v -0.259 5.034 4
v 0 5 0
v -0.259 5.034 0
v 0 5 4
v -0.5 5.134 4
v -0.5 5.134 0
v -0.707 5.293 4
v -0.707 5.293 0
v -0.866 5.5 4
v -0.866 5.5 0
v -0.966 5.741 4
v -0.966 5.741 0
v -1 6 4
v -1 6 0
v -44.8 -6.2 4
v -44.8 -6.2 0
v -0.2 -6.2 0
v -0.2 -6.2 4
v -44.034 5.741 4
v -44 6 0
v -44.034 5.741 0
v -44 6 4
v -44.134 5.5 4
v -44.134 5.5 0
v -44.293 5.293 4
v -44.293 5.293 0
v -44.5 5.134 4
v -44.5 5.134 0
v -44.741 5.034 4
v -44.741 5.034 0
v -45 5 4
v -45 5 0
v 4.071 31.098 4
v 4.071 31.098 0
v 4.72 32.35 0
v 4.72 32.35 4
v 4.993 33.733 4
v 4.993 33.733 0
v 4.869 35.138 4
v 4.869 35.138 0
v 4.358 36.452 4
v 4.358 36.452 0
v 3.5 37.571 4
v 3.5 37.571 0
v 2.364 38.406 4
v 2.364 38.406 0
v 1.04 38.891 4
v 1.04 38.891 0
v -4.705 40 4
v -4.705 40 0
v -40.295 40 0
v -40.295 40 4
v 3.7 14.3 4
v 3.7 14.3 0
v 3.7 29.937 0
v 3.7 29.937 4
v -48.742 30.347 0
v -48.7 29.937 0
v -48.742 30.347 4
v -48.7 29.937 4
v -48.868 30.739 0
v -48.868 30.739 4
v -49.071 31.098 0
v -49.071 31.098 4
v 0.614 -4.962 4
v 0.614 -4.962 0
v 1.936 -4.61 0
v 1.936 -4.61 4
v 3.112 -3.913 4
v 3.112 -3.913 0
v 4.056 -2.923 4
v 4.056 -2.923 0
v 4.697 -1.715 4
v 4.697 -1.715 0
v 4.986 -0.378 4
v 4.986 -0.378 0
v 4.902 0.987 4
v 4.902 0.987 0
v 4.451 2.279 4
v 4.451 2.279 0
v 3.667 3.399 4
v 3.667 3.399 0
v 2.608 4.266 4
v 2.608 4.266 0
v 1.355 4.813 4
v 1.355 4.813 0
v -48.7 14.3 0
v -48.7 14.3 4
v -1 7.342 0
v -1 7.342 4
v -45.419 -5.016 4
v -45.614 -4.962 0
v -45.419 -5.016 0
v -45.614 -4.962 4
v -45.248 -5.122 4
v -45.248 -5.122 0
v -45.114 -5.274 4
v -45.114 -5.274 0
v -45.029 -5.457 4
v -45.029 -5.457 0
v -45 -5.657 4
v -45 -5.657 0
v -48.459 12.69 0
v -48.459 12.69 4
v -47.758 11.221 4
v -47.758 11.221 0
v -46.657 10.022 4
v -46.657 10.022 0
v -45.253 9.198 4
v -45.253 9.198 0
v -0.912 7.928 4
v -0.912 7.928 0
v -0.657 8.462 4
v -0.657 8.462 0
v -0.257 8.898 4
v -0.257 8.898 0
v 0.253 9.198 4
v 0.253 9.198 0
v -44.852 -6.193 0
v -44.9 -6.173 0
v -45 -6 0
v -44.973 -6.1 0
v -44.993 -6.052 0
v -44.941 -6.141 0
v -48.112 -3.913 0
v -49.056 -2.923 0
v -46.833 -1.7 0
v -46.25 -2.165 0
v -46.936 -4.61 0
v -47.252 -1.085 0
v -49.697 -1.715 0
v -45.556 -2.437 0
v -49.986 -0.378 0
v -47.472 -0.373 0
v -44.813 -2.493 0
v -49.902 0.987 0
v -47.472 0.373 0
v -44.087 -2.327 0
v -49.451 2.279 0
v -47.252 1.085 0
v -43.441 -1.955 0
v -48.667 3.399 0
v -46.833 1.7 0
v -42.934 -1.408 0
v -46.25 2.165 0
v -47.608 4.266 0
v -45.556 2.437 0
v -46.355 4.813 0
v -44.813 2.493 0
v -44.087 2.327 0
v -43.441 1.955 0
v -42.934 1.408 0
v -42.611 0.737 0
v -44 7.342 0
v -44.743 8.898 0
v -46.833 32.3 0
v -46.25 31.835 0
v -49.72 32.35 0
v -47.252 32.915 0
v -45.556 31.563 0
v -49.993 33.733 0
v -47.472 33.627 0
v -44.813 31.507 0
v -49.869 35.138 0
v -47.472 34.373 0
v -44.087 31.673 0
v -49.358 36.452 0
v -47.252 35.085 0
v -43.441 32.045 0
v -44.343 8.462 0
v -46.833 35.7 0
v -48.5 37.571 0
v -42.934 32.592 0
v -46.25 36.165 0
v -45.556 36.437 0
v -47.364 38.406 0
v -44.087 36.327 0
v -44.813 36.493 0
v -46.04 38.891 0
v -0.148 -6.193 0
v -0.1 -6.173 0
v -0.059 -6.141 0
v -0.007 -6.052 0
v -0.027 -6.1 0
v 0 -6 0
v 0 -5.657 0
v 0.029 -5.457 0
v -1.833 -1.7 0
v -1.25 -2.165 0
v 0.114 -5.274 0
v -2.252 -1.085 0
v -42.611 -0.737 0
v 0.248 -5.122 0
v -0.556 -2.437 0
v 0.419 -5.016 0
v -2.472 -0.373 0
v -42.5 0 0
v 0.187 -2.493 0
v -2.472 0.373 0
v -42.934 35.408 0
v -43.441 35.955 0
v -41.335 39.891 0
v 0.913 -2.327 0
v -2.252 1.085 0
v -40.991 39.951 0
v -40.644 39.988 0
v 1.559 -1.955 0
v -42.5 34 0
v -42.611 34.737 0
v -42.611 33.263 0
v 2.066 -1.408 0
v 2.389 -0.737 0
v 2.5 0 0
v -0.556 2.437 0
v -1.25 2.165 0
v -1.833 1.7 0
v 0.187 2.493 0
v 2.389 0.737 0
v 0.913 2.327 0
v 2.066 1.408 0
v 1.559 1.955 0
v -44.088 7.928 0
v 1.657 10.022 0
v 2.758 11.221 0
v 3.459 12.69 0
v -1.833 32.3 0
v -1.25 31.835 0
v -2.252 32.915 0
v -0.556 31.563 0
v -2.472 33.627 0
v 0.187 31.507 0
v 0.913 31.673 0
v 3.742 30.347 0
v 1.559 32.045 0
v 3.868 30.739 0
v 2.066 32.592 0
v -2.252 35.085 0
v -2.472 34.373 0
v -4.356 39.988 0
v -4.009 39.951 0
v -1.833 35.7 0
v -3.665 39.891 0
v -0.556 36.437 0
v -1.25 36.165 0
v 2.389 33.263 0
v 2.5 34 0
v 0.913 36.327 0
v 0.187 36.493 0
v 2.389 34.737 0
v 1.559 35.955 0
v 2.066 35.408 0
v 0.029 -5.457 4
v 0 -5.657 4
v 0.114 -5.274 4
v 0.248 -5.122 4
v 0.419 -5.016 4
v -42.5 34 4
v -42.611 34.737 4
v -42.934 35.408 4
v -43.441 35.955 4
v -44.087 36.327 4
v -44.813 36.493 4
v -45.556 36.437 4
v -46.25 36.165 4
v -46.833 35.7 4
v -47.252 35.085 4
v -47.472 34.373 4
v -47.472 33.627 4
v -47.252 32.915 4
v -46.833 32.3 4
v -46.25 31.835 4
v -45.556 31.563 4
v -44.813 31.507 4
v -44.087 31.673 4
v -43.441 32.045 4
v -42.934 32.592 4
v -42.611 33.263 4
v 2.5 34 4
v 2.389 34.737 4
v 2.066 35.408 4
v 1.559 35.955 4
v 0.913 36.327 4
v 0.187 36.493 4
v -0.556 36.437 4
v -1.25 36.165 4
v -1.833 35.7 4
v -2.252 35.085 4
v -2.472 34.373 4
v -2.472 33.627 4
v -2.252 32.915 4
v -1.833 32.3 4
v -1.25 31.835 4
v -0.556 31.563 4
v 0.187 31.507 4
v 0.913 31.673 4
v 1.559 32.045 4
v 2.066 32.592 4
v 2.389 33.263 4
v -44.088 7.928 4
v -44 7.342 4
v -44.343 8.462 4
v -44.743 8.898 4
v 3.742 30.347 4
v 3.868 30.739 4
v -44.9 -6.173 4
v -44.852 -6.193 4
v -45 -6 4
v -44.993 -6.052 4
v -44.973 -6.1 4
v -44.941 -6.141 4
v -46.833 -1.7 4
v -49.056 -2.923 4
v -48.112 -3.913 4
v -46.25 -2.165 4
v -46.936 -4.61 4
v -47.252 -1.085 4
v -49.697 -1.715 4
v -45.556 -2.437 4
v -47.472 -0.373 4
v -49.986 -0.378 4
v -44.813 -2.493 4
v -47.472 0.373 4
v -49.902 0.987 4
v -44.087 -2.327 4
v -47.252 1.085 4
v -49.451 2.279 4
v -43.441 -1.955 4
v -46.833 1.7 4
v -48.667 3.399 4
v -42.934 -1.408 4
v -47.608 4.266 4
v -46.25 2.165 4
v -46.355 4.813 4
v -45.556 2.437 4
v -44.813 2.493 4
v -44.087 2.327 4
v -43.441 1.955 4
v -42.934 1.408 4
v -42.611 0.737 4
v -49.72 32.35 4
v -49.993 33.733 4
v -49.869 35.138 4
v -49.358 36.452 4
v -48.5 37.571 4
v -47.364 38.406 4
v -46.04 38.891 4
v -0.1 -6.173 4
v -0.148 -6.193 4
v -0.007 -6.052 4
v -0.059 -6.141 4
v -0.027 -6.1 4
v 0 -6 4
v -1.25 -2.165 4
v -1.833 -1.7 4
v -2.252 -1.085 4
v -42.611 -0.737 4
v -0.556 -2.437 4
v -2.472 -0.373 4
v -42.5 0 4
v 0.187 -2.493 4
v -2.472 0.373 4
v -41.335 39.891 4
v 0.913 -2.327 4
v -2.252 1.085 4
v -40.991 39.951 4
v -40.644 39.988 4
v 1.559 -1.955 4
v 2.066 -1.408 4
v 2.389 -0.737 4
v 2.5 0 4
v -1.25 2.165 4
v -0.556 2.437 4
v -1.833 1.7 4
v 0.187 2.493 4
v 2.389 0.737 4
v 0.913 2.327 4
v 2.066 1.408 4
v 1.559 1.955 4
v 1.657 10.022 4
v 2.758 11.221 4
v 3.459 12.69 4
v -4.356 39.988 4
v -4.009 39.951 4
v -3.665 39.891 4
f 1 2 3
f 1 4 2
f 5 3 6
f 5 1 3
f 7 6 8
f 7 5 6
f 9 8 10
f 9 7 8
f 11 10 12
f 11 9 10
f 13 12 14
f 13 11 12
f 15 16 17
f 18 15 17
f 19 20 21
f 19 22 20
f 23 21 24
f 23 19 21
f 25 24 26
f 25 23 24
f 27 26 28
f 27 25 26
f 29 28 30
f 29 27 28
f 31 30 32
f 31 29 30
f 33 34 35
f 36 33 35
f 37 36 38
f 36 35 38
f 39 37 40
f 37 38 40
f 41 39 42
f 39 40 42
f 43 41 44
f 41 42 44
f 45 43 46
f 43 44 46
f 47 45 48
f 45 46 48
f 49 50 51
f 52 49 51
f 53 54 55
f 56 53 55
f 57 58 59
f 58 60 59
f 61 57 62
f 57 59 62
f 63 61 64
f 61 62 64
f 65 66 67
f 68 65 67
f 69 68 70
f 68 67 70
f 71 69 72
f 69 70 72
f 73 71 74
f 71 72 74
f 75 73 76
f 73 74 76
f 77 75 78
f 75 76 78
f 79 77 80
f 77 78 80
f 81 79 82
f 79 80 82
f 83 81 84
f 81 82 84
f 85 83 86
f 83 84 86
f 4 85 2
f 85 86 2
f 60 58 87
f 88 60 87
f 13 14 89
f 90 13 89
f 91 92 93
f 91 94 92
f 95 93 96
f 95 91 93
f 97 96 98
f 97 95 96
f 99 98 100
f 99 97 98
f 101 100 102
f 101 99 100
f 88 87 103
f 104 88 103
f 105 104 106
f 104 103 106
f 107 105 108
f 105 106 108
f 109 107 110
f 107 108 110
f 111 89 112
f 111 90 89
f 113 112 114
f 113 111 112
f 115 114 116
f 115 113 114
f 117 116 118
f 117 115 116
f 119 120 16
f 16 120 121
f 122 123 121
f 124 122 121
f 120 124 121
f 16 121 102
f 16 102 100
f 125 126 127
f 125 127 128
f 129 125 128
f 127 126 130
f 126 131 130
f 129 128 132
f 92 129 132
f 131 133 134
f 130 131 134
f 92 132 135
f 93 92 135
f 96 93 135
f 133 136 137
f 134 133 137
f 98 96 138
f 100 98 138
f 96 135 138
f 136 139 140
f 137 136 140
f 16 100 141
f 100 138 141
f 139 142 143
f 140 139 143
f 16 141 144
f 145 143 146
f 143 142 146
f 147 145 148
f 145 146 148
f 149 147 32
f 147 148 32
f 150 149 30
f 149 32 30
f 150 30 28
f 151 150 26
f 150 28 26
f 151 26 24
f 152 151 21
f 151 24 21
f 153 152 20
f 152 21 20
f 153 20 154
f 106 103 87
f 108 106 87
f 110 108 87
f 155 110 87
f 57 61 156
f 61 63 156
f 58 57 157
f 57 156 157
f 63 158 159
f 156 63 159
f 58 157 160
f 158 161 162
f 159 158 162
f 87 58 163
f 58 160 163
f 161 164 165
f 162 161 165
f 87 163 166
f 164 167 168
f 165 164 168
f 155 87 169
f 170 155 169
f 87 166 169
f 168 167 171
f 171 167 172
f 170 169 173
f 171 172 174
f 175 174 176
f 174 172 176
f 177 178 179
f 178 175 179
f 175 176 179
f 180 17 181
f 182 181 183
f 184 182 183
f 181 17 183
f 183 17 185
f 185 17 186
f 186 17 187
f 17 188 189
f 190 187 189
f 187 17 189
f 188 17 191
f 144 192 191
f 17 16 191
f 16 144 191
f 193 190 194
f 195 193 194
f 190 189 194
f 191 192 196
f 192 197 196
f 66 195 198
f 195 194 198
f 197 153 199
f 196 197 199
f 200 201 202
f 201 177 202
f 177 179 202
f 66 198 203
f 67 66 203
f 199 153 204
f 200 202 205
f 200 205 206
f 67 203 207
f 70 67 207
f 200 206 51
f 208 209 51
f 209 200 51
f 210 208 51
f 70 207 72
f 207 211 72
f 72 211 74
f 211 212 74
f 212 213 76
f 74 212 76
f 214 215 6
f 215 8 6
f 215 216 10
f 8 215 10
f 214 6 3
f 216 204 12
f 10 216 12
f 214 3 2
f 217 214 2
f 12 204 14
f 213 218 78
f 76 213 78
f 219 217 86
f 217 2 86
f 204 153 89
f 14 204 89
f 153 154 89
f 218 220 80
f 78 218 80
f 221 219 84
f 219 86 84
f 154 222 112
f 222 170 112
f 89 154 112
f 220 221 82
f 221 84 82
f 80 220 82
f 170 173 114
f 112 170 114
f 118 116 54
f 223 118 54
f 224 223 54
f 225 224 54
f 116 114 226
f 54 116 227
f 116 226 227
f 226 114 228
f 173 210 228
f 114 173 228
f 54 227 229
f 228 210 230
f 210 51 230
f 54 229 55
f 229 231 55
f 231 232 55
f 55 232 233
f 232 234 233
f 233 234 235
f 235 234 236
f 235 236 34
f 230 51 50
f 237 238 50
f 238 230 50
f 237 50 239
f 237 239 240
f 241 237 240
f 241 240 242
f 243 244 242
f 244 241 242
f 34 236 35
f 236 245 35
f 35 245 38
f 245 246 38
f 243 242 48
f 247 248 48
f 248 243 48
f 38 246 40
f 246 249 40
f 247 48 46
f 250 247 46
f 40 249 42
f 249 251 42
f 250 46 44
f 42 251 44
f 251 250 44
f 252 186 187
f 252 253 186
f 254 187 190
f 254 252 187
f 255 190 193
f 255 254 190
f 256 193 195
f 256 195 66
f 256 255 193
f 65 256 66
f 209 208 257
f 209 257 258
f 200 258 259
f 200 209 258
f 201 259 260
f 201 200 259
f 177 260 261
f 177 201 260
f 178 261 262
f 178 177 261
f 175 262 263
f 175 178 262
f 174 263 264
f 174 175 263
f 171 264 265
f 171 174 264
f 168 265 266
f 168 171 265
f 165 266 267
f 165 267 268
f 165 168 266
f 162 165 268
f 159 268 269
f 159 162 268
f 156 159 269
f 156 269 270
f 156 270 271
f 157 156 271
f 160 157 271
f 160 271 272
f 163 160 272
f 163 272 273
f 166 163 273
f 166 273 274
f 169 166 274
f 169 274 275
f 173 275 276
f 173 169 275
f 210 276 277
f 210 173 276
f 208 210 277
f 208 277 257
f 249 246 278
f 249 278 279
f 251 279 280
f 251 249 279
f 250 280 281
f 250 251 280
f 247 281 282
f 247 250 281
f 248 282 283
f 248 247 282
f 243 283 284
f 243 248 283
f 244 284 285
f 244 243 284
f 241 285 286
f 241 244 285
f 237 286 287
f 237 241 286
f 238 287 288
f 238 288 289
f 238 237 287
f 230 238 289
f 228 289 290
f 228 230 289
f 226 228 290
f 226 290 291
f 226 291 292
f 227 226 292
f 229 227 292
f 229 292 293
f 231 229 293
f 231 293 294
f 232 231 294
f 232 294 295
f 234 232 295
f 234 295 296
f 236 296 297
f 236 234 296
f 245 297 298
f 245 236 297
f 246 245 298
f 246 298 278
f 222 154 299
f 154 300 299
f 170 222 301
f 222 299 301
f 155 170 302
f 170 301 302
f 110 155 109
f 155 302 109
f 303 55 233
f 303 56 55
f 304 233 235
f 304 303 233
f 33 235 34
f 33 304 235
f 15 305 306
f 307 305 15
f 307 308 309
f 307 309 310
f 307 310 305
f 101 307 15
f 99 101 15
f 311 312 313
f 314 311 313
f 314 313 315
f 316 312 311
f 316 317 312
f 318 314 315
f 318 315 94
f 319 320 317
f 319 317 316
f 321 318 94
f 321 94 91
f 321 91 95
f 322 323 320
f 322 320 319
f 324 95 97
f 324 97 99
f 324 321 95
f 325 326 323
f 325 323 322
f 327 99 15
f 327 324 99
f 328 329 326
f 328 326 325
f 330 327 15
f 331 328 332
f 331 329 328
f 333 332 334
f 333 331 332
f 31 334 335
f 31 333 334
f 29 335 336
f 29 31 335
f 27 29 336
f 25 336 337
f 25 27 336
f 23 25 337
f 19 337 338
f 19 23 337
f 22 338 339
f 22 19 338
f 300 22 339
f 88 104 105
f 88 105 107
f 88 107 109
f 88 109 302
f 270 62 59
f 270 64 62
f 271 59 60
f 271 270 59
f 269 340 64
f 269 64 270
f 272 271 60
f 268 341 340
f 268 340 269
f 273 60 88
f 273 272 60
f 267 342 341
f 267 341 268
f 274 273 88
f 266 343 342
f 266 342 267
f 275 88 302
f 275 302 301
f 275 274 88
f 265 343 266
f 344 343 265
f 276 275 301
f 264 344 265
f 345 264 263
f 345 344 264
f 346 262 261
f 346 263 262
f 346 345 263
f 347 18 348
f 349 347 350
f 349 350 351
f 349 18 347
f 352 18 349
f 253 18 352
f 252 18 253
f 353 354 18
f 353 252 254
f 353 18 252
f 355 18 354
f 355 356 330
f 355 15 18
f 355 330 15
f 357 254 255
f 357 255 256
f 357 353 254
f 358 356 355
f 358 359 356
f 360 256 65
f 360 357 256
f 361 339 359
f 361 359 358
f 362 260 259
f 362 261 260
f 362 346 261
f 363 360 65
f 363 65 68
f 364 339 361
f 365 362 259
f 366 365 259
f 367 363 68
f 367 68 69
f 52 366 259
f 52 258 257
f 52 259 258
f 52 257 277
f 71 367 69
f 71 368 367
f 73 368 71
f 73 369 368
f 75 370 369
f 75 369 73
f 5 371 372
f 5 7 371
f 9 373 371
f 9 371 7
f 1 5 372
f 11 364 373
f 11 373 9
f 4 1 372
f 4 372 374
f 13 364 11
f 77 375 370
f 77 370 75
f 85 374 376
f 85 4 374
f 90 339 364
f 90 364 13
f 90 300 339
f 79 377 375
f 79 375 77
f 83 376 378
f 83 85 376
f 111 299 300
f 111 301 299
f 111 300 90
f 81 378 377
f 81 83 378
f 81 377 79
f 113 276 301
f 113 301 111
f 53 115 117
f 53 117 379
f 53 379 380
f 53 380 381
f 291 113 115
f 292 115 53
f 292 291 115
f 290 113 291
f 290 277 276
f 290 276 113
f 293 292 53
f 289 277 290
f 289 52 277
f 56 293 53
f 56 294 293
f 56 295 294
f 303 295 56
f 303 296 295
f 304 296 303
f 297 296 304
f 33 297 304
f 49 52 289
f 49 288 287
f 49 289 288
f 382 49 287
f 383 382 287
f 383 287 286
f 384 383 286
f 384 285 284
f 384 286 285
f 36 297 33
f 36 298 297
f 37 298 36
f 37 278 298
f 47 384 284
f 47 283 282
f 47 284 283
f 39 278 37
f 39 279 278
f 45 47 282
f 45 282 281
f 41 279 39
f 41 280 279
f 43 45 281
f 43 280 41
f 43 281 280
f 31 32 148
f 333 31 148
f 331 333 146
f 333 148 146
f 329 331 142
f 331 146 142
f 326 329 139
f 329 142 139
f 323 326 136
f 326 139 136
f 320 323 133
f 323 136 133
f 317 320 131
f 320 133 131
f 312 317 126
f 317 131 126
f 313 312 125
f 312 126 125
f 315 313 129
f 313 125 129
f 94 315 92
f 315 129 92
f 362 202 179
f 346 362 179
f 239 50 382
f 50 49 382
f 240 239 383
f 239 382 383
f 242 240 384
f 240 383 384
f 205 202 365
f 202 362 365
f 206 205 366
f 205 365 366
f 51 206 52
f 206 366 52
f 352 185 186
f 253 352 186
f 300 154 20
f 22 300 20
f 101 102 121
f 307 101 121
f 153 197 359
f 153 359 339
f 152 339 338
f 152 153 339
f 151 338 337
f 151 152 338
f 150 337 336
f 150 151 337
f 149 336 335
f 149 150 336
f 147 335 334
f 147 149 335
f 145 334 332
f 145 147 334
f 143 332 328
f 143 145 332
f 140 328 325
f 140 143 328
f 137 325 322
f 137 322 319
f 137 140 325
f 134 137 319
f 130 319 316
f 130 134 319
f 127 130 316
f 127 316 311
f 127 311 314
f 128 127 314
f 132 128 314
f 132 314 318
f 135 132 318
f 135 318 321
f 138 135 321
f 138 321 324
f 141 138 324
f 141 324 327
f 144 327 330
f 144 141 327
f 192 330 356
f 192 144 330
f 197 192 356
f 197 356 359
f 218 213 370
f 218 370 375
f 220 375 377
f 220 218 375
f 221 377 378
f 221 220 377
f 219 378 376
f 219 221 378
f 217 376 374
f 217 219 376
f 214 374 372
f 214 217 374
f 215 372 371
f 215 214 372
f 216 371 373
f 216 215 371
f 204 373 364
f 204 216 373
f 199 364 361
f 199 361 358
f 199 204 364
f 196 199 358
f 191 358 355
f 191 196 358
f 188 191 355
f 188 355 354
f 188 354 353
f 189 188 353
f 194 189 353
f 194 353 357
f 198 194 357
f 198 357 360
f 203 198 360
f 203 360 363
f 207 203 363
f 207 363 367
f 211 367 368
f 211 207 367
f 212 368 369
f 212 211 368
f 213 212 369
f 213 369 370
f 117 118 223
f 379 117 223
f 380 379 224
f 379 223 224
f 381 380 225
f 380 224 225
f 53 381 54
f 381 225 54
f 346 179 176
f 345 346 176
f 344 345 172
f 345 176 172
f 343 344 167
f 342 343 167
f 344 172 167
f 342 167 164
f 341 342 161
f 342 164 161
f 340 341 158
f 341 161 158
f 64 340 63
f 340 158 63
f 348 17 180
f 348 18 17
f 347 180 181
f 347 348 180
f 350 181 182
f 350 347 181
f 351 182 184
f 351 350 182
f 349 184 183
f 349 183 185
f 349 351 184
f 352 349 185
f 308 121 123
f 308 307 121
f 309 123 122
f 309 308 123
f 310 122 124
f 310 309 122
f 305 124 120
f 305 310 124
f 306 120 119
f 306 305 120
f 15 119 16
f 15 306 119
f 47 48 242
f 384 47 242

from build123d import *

# Parameters (mm, degrees)
F0_R     = 2.5
F1_DEPTH = 4
F2_R     = 2
F3_R     = 1
F4_R     = 0.7
F5_R     = 0.2
F6_R     = 2
F7_R     = 5


with BuildPart() as f1:
    # F0 (on Top) → F1 (new body)
    with BuildSketch(Plane.XY):
        with BuildLine():
            Line((-44, 8.8584928558), (-44, 4.8989794856))
            ThreePointArc((-44, 4.8989794856), (-49.974680765, 0.50254481), (-45, -5))
            Line((-45, -5), (-45, -6.2))
            Line((-45, -6.2), (0, -6.2))
            Line((0, -6.2), (0, -5))
            ThreePointArc((0, -5), (4.974680765, 0.50254481), (-1, 4.8989794856))
            Line((-1, 4.8989794856), (-1, 8.8584928558))
            ThreePointArc((-1, 8.8584928558), (2.3623310777, 10.7048643976), (3.7, 14.3))
            Line((3.7, 14.3), (3.7, 30.6369656558))
            ThreePointArc((3.7, 30.6369656558), (4.7588909504, 35.5339351103), (1.0395584541, 38.8907380037))
            Line((1.0395584541, 38.8907380037), (-4.1791089332, 40))
            Line((-4.1791089332, 40), (-40.8208910668, 40))
            Line((-40.8208910668, 40), (-46.0395584541, 38.8907380037))
            ThreePointArc((-46.0395584541, 38.8907380037), (-49.7588909504, 35.5339351103), (-48.7, 30.6369656558))
            Line((-48.7, 30.6369656558), (-48.7, 14.3))
            ThreePointArc((-48.7, 14.3), (-47.3623310777, 10.7048643976), (-44, 8.8584928558))
        make_face()
        with Locations((-45, 0)):
            Circle(F0_R, mode=Mode.SUBTRACT)
        Circle(F0_R, mode=Mode.SUBTRACT)
        with Locations((-45, 34)):
            Circle(F0_R, mode=Mode.SUBTRACT)
        with Locations((0, 34)):
            Circle(F0_R, mode=Mode.SUBTRACT)
    extrude(amount=F1_DEPTH)

    # F2
    f2_edges = [f1.edges().sort_by_distance(p)[0] for p in [
        (-44, 8.858493, 2),
        (-1, 8.858493, 2),
    ]]
    fillet(f2_edges, radius=F2_R)

    # F3
    f3_edges = [f1.edges().sort_by_distance(p)[0] for p in [
        (-1, 4.898979, 2),
        (-44, 4.898979, 2),
    ]]
    fillet(f3_edges, radius=F3_R)

    # F4
    f4_edges = [f1.edges().sort_by_distance(p)[0] for p in [
        (-45, -5, 2),
        (0, -5, 2),
    ]]
    fillet(f4_edges, radius=F4_R)

    # F5
    f5_edges = [f1.edges().sort_by_distance(p)[0] for p in [
        (-45, -6.2, 2),
        (0, -6.2, 2),
    ]]
    fillet(f5_edges, radius=F5_R)

    # F6
    f6_edges = [f1.edges().sort_by_distance(p)[0] for p in [
        (-48.7, 30.636966, 2),
        (3.7, 30.636966, 2),
    ]]
    fillet(f6_edges, radius=F6_R)

    # F7
    f7_edges = [f1.edges().sort_by_distance(p)[0] for p in [
        (-40.820891, 40, 2),
        (-4.179109, 40, 2),
    ]]
    fillet(f7_edges, radius=F7_R)


solid = f1.part
